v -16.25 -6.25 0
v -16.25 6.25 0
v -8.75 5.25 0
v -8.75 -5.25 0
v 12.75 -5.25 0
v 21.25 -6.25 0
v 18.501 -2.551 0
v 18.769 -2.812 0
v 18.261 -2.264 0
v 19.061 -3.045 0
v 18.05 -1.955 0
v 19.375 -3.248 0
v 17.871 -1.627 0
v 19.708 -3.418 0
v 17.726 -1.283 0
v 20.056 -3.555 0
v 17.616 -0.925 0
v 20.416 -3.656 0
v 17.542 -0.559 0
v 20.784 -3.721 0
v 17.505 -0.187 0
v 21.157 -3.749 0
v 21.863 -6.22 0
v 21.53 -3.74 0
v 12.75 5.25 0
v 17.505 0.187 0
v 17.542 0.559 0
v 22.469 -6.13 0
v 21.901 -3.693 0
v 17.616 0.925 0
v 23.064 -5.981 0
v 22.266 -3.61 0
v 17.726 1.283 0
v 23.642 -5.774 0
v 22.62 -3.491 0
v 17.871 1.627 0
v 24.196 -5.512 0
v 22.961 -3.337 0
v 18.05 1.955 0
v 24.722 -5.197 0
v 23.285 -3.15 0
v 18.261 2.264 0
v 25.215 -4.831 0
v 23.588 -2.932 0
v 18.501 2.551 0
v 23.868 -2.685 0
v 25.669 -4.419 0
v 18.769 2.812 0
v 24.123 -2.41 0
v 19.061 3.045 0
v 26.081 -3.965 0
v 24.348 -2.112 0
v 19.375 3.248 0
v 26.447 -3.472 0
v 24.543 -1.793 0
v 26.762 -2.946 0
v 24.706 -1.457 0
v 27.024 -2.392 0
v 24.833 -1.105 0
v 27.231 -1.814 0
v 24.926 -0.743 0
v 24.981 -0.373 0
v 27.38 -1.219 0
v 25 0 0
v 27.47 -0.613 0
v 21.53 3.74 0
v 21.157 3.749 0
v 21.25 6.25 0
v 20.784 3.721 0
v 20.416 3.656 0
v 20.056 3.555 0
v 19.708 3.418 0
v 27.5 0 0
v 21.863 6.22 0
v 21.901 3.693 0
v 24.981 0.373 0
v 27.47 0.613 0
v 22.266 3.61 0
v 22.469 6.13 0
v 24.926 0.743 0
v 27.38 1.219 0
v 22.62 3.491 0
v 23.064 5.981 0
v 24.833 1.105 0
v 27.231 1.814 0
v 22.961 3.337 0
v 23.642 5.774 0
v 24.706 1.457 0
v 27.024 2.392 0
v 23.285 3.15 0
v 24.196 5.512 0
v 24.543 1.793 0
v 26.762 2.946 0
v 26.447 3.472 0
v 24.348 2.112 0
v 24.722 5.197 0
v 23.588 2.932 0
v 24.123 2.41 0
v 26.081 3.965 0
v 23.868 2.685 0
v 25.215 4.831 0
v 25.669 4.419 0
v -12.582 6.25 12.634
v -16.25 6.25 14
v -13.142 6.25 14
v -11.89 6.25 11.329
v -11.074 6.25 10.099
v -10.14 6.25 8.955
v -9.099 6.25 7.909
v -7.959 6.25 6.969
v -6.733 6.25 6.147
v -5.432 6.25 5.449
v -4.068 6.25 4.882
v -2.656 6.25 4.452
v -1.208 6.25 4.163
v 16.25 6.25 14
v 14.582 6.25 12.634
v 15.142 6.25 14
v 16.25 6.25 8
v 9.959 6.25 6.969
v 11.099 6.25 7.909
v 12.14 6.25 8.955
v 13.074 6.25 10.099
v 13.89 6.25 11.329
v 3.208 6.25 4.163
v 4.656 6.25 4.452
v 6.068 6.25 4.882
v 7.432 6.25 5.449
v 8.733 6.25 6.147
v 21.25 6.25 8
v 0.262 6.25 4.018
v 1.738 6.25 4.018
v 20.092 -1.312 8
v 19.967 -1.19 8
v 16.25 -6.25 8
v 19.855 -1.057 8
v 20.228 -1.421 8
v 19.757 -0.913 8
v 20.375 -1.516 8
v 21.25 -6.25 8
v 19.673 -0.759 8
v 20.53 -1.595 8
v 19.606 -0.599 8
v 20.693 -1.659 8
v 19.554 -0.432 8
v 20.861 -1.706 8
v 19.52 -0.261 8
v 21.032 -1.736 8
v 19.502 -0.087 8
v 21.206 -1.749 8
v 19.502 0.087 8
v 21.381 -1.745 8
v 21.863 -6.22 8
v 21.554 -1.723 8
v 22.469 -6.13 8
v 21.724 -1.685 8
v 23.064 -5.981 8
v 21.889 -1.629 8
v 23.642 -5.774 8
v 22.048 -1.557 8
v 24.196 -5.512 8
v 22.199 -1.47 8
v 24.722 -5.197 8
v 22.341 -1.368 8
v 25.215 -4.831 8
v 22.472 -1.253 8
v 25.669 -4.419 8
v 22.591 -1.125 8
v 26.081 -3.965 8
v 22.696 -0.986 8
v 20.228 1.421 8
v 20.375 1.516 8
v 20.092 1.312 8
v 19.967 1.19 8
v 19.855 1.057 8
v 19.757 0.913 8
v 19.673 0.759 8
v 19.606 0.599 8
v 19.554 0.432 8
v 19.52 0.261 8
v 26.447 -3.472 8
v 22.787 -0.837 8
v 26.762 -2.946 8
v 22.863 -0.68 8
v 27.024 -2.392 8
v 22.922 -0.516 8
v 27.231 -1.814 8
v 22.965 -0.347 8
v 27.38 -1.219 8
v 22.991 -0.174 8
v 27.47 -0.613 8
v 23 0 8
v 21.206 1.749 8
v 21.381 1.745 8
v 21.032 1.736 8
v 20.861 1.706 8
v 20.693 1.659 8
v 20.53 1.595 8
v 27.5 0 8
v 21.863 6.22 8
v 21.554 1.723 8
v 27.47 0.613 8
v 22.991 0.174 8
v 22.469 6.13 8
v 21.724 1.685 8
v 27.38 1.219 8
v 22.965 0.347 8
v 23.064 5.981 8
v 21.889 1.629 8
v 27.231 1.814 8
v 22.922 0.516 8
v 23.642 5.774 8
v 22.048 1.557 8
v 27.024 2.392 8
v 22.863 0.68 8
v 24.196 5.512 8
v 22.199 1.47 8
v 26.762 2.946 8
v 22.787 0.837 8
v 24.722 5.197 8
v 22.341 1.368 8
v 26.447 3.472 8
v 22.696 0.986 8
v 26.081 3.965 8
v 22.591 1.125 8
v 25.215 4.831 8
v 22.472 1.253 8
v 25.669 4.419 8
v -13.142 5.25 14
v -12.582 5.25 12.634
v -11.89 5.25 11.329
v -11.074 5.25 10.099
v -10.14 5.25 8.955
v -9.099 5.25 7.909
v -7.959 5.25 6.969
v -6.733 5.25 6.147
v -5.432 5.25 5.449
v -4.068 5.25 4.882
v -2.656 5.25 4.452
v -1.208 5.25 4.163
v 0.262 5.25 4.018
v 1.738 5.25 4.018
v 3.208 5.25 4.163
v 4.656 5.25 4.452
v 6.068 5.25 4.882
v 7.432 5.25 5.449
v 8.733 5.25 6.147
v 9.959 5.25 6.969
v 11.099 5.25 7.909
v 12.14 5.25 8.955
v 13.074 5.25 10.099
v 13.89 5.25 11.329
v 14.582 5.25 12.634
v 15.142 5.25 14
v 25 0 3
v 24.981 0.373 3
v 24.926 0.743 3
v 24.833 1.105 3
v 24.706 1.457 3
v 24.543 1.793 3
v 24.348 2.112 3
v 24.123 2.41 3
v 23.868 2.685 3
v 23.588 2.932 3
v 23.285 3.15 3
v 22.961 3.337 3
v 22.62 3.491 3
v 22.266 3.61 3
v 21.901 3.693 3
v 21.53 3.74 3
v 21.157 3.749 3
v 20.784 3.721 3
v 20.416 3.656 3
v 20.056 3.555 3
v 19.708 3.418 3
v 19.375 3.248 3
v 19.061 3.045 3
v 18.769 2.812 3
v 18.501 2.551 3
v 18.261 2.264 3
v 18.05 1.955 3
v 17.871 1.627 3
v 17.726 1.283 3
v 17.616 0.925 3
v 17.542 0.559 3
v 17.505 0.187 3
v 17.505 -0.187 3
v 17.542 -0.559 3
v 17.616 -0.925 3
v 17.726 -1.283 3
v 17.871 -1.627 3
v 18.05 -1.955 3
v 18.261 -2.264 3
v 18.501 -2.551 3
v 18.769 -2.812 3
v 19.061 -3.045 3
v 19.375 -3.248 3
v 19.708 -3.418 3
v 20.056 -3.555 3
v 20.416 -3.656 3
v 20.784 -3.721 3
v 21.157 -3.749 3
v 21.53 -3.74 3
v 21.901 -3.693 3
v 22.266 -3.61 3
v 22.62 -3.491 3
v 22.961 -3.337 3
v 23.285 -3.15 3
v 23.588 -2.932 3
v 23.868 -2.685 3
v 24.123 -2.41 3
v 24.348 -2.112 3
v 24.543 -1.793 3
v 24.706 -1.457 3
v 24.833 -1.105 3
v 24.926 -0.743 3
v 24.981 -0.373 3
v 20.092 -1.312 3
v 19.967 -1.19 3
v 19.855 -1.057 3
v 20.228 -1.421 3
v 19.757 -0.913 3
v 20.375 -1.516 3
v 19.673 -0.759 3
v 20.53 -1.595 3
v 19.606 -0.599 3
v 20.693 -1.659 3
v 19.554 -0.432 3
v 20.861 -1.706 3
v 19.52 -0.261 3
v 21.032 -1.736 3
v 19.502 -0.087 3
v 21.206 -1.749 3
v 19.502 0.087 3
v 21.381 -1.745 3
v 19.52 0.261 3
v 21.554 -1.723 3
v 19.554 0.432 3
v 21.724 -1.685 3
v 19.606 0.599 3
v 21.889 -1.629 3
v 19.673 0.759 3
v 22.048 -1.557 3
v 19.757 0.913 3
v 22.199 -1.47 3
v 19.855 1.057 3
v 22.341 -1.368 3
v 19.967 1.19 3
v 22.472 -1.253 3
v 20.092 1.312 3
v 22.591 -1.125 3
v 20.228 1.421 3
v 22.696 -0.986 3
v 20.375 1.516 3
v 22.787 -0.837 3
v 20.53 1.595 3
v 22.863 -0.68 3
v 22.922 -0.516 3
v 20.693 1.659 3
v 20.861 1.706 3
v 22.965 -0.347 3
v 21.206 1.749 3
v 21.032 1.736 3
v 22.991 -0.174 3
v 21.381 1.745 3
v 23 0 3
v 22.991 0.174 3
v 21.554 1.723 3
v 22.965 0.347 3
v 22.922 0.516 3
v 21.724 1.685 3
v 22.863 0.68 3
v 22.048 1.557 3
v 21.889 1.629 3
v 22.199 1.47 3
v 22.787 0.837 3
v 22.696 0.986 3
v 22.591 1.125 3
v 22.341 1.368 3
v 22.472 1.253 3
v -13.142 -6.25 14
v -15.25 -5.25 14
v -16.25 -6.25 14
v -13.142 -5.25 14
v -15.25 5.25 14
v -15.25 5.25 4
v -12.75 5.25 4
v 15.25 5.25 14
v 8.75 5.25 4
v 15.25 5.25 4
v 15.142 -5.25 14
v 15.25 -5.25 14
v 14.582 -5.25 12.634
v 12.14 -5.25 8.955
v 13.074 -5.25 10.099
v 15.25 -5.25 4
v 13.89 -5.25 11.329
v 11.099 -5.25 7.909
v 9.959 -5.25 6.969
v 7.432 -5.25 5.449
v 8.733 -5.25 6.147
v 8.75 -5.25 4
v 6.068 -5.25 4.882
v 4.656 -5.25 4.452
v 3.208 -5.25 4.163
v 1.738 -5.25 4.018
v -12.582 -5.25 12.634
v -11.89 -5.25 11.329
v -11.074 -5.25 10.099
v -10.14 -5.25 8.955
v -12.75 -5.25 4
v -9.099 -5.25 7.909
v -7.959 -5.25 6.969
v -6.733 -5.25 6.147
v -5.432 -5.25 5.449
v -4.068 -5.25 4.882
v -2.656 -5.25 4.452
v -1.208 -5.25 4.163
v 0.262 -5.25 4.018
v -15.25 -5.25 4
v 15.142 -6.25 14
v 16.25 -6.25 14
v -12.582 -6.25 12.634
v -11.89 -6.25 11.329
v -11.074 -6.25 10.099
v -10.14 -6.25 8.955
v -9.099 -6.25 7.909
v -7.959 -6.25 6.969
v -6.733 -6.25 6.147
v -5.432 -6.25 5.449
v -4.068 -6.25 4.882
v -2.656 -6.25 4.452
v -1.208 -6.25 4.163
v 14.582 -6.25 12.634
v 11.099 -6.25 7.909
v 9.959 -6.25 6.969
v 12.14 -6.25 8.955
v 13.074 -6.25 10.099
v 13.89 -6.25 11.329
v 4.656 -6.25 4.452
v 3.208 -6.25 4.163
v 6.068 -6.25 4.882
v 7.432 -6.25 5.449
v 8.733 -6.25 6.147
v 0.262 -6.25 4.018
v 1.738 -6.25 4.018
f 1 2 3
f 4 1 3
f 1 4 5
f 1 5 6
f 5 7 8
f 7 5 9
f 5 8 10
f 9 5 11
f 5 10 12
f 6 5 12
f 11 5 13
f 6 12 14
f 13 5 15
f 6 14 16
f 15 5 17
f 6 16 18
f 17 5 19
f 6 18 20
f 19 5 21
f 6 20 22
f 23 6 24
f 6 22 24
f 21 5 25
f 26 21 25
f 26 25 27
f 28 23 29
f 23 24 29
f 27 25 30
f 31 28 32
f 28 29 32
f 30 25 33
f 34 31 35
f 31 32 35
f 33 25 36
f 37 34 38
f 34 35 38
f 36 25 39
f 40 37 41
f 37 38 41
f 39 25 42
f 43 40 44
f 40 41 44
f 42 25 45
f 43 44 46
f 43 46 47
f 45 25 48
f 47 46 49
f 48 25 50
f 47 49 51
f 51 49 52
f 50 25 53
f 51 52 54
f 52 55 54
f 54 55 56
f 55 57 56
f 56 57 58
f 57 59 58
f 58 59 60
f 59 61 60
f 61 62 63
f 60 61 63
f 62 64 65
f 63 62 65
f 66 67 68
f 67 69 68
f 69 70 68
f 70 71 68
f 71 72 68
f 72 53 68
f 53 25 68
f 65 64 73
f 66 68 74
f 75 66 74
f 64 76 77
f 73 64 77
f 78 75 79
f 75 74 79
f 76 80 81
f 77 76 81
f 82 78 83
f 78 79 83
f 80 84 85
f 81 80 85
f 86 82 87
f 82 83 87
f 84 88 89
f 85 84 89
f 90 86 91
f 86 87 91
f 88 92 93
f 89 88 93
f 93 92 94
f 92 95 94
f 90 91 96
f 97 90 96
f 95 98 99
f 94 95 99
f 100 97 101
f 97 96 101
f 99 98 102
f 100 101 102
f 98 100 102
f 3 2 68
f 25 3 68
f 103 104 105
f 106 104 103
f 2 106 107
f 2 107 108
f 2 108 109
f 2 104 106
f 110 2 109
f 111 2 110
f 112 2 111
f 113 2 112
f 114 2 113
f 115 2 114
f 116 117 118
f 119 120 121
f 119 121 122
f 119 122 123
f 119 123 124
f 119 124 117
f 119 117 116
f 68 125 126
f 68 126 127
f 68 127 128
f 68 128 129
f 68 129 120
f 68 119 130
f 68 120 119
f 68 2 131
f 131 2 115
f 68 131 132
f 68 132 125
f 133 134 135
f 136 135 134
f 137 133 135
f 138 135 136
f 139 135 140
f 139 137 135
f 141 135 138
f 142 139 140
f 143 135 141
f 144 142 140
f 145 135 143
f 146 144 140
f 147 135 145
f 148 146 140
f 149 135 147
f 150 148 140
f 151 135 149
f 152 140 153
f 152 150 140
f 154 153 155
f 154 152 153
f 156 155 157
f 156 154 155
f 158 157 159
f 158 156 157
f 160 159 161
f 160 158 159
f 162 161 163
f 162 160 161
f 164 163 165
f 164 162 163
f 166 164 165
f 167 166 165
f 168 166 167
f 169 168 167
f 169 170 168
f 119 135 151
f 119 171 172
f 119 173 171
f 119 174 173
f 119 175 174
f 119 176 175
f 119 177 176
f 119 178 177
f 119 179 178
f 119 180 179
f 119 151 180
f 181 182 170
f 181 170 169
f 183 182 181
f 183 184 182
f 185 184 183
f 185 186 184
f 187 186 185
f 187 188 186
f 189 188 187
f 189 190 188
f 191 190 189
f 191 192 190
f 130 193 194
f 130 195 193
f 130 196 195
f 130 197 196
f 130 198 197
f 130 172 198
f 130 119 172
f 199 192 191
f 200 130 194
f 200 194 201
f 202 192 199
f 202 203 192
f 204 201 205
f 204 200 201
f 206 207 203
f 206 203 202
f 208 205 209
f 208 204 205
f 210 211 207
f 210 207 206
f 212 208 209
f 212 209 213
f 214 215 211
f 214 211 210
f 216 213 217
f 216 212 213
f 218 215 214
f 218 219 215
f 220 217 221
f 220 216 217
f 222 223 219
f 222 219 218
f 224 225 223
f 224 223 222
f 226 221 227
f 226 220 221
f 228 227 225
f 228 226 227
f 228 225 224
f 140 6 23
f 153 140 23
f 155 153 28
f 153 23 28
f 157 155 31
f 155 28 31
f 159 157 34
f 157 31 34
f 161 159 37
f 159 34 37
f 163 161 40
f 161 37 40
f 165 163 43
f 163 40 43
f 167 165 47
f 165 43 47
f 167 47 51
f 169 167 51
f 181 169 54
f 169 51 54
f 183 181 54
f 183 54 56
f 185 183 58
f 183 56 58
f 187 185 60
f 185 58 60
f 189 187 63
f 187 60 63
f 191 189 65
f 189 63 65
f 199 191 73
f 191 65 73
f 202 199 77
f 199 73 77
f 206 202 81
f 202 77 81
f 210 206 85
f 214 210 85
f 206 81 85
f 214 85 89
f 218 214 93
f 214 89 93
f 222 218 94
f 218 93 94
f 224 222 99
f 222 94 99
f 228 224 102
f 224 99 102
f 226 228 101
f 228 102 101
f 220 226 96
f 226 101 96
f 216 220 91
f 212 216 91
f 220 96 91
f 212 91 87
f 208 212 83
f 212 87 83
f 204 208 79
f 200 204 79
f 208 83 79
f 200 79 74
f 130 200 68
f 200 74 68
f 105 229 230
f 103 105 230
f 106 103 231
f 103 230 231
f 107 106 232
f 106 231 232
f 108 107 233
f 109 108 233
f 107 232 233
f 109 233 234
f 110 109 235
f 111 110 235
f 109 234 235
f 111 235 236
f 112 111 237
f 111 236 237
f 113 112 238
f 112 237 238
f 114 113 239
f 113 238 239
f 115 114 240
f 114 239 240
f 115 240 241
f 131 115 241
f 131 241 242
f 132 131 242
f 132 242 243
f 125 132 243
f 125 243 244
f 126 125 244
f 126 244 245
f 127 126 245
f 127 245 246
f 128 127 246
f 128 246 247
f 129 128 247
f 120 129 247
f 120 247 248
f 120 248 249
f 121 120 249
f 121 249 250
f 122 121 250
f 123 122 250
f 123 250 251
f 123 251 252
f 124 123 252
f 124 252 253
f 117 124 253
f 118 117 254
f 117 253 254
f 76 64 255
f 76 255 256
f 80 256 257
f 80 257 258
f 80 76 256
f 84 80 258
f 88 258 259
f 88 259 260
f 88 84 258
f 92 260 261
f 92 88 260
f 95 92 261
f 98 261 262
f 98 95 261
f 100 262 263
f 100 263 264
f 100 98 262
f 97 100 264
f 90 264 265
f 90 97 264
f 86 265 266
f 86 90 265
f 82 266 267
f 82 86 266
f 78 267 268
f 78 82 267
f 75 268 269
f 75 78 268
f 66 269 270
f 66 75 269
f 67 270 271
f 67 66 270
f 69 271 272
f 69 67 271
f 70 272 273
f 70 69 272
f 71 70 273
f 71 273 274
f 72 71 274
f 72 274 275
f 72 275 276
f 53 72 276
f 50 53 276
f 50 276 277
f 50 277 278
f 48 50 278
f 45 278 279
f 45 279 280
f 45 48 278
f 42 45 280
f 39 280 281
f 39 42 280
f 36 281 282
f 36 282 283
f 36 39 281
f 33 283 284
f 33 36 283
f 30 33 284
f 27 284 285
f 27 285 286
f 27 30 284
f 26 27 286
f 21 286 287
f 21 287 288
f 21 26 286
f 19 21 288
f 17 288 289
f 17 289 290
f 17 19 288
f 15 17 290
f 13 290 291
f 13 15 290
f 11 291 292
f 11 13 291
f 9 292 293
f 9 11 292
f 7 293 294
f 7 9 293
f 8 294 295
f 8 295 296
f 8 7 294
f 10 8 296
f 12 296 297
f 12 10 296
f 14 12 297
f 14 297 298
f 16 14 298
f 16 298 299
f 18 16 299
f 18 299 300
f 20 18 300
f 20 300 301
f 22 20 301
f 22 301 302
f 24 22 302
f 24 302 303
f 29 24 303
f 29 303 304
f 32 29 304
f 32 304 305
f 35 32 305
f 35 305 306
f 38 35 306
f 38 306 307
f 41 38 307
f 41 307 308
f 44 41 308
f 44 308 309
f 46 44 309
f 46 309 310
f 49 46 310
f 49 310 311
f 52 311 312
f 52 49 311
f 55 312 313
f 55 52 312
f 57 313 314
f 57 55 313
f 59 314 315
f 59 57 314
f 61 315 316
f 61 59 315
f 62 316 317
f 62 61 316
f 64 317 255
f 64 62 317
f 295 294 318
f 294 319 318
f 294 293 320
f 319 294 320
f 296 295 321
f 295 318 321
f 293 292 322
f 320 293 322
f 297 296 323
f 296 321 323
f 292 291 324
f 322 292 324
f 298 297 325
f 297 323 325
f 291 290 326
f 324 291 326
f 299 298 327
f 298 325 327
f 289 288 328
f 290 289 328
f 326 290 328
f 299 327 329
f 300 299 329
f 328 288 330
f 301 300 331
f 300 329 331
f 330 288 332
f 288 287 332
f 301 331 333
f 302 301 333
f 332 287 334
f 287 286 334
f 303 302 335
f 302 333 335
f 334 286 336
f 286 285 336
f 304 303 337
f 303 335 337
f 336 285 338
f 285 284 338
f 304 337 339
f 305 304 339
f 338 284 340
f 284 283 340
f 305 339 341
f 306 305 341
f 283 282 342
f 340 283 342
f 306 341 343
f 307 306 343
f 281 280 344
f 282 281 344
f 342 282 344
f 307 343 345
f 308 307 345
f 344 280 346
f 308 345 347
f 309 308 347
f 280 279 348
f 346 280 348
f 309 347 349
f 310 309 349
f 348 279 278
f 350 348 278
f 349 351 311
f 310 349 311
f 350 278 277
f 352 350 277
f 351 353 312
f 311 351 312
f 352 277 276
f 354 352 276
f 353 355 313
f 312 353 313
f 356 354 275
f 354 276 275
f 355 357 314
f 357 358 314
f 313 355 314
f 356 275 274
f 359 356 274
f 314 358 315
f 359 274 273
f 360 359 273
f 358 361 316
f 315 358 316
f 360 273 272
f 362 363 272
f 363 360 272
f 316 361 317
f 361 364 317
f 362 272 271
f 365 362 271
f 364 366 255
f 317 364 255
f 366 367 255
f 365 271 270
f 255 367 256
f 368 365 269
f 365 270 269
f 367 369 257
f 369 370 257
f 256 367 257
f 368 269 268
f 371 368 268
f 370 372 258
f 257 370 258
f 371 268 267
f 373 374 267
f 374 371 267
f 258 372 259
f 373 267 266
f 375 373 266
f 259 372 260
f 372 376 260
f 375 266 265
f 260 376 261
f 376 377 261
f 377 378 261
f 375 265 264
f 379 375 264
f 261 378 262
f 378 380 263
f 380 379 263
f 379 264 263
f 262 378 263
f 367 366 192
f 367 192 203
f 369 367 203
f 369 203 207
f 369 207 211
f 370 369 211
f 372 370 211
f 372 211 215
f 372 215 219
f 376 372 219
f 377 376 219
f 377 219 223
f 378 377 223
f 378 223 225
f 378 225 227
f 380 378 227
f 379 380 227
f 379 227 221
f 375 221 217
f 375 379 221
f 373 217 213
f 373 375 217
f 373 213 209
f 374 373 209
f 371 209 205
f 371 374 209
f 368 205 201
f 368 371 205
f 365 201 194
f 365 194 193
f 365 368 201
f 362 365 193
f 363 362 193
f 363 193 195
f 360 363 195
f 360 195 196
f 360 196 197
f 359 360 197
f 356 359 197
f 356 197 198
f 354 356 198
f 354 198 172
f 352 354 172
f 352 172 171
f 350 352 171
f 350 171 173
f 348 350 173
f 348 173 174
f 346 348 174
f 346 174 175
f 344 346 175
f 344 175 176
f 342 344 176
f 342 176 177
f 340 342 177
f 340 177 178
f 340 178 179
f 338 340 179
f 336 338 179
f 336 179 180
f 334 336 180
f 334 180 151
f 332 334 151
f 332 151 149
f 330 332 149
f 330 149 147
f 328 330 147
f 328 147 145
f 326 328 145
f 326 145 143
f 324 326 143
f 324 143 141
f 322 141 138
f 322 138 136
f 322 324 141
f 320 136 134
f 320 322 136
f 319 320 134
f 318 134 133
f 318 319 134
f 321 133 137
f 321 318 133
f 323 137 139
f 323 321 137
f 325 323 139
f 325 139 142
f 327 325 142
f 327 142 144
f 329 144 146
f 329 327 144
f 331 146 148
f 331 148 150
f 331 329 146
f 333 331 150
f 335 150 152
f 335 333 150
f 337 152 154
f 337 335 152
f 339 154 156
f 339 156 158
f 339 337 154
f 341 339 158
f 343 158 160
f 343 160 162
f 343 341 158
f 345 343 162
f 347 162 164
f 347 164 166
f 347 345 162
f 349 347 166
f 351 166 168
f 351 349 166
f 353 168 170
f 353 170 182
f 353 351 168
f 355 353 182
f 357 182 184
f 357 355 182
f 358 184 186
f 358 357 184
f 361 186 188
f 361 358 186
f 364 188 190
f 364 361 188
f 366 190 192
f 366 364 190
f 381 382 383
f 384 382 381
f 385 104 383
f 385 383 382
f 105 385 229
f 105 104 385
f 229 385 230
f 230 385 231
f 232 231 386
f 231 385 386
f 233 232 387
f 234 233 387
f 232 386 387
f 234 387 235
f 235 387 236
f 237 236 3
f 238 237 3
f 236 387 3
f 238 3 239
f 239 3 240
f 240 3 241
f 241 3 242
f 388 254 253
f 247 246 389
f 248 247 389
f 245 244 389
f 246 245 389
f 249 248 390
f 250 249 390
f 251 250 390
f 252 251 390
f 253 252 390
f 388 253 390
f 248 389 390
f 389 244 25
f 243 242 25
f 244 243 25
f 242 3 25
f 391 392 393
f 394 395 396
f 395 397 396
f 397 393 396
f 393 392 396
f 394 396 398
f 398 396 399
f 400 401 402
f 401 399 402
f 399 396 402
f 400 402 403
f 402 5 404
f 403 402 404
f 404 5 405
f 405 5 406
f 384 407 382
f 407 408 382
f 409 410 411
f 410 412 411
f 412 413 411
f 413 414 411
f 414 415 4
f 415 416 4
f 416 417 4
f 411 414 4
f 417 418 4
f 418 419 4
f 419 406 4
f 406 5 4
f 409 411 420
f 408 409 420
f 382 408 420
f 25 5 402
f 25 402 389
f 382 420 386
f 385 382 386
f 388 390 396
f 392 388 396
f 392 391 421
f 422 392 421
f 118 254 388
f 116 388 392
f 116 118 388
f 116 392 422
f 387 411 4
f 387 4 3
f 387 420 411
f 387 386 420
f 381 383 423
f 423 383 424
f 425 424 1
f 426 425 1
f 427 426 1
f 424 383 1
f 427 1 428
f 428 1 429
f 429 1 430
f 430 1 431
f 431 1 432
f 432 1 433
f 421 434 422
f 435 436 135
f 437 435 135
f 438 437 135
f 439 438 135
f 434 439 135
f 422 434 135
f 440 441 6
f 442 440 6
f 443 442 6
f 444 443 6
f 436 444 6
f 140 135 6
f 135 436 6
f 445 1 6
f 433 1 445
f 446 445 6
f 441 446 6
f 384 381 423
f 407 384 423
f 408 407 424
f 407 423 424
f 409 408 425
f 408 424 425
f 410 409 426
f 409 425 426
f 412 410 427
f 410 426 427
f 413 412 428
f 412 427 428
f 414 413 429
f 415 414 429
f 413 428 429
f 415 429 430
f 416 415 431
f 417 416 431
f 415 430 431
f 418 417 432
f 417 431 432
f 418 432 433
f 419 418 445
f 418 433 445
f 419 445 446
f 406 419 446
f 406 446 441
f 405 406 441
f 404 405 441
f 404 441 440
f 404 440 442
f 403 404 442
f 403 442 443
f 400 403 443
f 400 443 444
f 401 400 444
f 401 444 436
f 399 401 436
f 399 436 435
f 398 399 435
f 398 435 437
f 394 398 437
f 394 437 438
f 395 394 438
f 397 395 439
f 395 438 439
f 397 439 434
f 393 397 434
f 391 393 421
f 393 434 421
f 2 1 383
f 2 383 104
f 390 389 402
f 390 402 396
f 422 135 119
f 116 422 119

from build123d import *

# Parameters (mm, degrees)
F0_R     = 1.75
F1_DEPTH = 8
F0_W     = 32.5
F0_H     = 12.5
F2_DEPTH = 14
F0_W_2   = 6.5
F0_H_2   = 10.5
F3_DEPTH = 4
F4_SIZE  = 3.99999
F6_DEPTH = 25
F7_R     = 3.75
F7_R_2   = 1.75
F8_DEPTH = 3


# Not quite as in the source:
# - a fillet or chamfer is up to 0.001 mm smaller than in the source, because OpenCascade refuses the exact size


with BuildPart() as f1:
    # F0 (on Top) → F1 (new body)
    with BuildSketch(Plane.XY):
        with BuildLine():
            Line((16.25, 6.25), (16.25, -6.25))
            Line((16.25, -6.25), (21.25, -6.25))
            ThreePointArc((21.25, -6.25), (27.5, 0), (21.25, 6.25))
            Line((21.25, 6.25), (16.25, 6.25))
        make_face()
        with Locations((21.25, 0)):
            Circle(F0_R, mode=Mode.SUBTRACT)
    extrude(amount=F1_DEPTH)

    # F0 (on Top) → F2 (join)
    with BuildSketch(Plane.XY):
        Rectangle(F0_W, F0_H)
        Polygon((15.25, 5.25), (15.25, -5.25), (8.75, -5.25), (-8.75, -5.25), (-15.25, -5.25), (-15.25, 5.25), (-8.75, 5.25), (8.75, 5.25), align=None, mode=Mode.SUBTRACT)
    extrude(amount=F2_DEPTH)

    # F0 (on Top) → F3 (join)
    with BuildSketch(Plane.XY):
        with Locations((12, 0)):
            Rectangle(F0_W_2, F0_H_2)
        with Locations((-12, 0)):
            Rectangle(F0_W_2, F0_H_2)
    extrude(amount=F3_DEPTH)

    # F4 (size 4 in the source; OpenCascade refuses exactly that, so slightly less here)
    f4_edges = [f1.edges().sort_by_distance(p)[0] for p in [
        (-8.75, 0, 4),
        (8.75, 0, 0),
    ]]
    chamfer(f4_edges, length=F4_SIZE)

    # F5 (on face) → F6 (cut)
    with BuildSketch(Plane.XZ.offset(6.25)):
        with BuildLine():
            Line((15.1421356237, 14), (-13.1421356237, 14))
            ThreePointArc((-13.1421356237, 14), (1, 4), (15.1421356237, 14))
        make_face()
    extrude(amount=-F6_DEPTH, mode=Mode.SUBTRACT)

    # F7 (on face) → F8 (cut)
    with BuildSketch(Plane.XY):
        with Locations((21.25, 0)):
            Circle(F7_R)
        with Locations((21.25, 0)):
            Circle(F7_R_2, mode=Mode.SUBTRACT)
    extrude(amount=F8_DEPTH, mode=Mode.SUBTRACT)


solid = f1.part
